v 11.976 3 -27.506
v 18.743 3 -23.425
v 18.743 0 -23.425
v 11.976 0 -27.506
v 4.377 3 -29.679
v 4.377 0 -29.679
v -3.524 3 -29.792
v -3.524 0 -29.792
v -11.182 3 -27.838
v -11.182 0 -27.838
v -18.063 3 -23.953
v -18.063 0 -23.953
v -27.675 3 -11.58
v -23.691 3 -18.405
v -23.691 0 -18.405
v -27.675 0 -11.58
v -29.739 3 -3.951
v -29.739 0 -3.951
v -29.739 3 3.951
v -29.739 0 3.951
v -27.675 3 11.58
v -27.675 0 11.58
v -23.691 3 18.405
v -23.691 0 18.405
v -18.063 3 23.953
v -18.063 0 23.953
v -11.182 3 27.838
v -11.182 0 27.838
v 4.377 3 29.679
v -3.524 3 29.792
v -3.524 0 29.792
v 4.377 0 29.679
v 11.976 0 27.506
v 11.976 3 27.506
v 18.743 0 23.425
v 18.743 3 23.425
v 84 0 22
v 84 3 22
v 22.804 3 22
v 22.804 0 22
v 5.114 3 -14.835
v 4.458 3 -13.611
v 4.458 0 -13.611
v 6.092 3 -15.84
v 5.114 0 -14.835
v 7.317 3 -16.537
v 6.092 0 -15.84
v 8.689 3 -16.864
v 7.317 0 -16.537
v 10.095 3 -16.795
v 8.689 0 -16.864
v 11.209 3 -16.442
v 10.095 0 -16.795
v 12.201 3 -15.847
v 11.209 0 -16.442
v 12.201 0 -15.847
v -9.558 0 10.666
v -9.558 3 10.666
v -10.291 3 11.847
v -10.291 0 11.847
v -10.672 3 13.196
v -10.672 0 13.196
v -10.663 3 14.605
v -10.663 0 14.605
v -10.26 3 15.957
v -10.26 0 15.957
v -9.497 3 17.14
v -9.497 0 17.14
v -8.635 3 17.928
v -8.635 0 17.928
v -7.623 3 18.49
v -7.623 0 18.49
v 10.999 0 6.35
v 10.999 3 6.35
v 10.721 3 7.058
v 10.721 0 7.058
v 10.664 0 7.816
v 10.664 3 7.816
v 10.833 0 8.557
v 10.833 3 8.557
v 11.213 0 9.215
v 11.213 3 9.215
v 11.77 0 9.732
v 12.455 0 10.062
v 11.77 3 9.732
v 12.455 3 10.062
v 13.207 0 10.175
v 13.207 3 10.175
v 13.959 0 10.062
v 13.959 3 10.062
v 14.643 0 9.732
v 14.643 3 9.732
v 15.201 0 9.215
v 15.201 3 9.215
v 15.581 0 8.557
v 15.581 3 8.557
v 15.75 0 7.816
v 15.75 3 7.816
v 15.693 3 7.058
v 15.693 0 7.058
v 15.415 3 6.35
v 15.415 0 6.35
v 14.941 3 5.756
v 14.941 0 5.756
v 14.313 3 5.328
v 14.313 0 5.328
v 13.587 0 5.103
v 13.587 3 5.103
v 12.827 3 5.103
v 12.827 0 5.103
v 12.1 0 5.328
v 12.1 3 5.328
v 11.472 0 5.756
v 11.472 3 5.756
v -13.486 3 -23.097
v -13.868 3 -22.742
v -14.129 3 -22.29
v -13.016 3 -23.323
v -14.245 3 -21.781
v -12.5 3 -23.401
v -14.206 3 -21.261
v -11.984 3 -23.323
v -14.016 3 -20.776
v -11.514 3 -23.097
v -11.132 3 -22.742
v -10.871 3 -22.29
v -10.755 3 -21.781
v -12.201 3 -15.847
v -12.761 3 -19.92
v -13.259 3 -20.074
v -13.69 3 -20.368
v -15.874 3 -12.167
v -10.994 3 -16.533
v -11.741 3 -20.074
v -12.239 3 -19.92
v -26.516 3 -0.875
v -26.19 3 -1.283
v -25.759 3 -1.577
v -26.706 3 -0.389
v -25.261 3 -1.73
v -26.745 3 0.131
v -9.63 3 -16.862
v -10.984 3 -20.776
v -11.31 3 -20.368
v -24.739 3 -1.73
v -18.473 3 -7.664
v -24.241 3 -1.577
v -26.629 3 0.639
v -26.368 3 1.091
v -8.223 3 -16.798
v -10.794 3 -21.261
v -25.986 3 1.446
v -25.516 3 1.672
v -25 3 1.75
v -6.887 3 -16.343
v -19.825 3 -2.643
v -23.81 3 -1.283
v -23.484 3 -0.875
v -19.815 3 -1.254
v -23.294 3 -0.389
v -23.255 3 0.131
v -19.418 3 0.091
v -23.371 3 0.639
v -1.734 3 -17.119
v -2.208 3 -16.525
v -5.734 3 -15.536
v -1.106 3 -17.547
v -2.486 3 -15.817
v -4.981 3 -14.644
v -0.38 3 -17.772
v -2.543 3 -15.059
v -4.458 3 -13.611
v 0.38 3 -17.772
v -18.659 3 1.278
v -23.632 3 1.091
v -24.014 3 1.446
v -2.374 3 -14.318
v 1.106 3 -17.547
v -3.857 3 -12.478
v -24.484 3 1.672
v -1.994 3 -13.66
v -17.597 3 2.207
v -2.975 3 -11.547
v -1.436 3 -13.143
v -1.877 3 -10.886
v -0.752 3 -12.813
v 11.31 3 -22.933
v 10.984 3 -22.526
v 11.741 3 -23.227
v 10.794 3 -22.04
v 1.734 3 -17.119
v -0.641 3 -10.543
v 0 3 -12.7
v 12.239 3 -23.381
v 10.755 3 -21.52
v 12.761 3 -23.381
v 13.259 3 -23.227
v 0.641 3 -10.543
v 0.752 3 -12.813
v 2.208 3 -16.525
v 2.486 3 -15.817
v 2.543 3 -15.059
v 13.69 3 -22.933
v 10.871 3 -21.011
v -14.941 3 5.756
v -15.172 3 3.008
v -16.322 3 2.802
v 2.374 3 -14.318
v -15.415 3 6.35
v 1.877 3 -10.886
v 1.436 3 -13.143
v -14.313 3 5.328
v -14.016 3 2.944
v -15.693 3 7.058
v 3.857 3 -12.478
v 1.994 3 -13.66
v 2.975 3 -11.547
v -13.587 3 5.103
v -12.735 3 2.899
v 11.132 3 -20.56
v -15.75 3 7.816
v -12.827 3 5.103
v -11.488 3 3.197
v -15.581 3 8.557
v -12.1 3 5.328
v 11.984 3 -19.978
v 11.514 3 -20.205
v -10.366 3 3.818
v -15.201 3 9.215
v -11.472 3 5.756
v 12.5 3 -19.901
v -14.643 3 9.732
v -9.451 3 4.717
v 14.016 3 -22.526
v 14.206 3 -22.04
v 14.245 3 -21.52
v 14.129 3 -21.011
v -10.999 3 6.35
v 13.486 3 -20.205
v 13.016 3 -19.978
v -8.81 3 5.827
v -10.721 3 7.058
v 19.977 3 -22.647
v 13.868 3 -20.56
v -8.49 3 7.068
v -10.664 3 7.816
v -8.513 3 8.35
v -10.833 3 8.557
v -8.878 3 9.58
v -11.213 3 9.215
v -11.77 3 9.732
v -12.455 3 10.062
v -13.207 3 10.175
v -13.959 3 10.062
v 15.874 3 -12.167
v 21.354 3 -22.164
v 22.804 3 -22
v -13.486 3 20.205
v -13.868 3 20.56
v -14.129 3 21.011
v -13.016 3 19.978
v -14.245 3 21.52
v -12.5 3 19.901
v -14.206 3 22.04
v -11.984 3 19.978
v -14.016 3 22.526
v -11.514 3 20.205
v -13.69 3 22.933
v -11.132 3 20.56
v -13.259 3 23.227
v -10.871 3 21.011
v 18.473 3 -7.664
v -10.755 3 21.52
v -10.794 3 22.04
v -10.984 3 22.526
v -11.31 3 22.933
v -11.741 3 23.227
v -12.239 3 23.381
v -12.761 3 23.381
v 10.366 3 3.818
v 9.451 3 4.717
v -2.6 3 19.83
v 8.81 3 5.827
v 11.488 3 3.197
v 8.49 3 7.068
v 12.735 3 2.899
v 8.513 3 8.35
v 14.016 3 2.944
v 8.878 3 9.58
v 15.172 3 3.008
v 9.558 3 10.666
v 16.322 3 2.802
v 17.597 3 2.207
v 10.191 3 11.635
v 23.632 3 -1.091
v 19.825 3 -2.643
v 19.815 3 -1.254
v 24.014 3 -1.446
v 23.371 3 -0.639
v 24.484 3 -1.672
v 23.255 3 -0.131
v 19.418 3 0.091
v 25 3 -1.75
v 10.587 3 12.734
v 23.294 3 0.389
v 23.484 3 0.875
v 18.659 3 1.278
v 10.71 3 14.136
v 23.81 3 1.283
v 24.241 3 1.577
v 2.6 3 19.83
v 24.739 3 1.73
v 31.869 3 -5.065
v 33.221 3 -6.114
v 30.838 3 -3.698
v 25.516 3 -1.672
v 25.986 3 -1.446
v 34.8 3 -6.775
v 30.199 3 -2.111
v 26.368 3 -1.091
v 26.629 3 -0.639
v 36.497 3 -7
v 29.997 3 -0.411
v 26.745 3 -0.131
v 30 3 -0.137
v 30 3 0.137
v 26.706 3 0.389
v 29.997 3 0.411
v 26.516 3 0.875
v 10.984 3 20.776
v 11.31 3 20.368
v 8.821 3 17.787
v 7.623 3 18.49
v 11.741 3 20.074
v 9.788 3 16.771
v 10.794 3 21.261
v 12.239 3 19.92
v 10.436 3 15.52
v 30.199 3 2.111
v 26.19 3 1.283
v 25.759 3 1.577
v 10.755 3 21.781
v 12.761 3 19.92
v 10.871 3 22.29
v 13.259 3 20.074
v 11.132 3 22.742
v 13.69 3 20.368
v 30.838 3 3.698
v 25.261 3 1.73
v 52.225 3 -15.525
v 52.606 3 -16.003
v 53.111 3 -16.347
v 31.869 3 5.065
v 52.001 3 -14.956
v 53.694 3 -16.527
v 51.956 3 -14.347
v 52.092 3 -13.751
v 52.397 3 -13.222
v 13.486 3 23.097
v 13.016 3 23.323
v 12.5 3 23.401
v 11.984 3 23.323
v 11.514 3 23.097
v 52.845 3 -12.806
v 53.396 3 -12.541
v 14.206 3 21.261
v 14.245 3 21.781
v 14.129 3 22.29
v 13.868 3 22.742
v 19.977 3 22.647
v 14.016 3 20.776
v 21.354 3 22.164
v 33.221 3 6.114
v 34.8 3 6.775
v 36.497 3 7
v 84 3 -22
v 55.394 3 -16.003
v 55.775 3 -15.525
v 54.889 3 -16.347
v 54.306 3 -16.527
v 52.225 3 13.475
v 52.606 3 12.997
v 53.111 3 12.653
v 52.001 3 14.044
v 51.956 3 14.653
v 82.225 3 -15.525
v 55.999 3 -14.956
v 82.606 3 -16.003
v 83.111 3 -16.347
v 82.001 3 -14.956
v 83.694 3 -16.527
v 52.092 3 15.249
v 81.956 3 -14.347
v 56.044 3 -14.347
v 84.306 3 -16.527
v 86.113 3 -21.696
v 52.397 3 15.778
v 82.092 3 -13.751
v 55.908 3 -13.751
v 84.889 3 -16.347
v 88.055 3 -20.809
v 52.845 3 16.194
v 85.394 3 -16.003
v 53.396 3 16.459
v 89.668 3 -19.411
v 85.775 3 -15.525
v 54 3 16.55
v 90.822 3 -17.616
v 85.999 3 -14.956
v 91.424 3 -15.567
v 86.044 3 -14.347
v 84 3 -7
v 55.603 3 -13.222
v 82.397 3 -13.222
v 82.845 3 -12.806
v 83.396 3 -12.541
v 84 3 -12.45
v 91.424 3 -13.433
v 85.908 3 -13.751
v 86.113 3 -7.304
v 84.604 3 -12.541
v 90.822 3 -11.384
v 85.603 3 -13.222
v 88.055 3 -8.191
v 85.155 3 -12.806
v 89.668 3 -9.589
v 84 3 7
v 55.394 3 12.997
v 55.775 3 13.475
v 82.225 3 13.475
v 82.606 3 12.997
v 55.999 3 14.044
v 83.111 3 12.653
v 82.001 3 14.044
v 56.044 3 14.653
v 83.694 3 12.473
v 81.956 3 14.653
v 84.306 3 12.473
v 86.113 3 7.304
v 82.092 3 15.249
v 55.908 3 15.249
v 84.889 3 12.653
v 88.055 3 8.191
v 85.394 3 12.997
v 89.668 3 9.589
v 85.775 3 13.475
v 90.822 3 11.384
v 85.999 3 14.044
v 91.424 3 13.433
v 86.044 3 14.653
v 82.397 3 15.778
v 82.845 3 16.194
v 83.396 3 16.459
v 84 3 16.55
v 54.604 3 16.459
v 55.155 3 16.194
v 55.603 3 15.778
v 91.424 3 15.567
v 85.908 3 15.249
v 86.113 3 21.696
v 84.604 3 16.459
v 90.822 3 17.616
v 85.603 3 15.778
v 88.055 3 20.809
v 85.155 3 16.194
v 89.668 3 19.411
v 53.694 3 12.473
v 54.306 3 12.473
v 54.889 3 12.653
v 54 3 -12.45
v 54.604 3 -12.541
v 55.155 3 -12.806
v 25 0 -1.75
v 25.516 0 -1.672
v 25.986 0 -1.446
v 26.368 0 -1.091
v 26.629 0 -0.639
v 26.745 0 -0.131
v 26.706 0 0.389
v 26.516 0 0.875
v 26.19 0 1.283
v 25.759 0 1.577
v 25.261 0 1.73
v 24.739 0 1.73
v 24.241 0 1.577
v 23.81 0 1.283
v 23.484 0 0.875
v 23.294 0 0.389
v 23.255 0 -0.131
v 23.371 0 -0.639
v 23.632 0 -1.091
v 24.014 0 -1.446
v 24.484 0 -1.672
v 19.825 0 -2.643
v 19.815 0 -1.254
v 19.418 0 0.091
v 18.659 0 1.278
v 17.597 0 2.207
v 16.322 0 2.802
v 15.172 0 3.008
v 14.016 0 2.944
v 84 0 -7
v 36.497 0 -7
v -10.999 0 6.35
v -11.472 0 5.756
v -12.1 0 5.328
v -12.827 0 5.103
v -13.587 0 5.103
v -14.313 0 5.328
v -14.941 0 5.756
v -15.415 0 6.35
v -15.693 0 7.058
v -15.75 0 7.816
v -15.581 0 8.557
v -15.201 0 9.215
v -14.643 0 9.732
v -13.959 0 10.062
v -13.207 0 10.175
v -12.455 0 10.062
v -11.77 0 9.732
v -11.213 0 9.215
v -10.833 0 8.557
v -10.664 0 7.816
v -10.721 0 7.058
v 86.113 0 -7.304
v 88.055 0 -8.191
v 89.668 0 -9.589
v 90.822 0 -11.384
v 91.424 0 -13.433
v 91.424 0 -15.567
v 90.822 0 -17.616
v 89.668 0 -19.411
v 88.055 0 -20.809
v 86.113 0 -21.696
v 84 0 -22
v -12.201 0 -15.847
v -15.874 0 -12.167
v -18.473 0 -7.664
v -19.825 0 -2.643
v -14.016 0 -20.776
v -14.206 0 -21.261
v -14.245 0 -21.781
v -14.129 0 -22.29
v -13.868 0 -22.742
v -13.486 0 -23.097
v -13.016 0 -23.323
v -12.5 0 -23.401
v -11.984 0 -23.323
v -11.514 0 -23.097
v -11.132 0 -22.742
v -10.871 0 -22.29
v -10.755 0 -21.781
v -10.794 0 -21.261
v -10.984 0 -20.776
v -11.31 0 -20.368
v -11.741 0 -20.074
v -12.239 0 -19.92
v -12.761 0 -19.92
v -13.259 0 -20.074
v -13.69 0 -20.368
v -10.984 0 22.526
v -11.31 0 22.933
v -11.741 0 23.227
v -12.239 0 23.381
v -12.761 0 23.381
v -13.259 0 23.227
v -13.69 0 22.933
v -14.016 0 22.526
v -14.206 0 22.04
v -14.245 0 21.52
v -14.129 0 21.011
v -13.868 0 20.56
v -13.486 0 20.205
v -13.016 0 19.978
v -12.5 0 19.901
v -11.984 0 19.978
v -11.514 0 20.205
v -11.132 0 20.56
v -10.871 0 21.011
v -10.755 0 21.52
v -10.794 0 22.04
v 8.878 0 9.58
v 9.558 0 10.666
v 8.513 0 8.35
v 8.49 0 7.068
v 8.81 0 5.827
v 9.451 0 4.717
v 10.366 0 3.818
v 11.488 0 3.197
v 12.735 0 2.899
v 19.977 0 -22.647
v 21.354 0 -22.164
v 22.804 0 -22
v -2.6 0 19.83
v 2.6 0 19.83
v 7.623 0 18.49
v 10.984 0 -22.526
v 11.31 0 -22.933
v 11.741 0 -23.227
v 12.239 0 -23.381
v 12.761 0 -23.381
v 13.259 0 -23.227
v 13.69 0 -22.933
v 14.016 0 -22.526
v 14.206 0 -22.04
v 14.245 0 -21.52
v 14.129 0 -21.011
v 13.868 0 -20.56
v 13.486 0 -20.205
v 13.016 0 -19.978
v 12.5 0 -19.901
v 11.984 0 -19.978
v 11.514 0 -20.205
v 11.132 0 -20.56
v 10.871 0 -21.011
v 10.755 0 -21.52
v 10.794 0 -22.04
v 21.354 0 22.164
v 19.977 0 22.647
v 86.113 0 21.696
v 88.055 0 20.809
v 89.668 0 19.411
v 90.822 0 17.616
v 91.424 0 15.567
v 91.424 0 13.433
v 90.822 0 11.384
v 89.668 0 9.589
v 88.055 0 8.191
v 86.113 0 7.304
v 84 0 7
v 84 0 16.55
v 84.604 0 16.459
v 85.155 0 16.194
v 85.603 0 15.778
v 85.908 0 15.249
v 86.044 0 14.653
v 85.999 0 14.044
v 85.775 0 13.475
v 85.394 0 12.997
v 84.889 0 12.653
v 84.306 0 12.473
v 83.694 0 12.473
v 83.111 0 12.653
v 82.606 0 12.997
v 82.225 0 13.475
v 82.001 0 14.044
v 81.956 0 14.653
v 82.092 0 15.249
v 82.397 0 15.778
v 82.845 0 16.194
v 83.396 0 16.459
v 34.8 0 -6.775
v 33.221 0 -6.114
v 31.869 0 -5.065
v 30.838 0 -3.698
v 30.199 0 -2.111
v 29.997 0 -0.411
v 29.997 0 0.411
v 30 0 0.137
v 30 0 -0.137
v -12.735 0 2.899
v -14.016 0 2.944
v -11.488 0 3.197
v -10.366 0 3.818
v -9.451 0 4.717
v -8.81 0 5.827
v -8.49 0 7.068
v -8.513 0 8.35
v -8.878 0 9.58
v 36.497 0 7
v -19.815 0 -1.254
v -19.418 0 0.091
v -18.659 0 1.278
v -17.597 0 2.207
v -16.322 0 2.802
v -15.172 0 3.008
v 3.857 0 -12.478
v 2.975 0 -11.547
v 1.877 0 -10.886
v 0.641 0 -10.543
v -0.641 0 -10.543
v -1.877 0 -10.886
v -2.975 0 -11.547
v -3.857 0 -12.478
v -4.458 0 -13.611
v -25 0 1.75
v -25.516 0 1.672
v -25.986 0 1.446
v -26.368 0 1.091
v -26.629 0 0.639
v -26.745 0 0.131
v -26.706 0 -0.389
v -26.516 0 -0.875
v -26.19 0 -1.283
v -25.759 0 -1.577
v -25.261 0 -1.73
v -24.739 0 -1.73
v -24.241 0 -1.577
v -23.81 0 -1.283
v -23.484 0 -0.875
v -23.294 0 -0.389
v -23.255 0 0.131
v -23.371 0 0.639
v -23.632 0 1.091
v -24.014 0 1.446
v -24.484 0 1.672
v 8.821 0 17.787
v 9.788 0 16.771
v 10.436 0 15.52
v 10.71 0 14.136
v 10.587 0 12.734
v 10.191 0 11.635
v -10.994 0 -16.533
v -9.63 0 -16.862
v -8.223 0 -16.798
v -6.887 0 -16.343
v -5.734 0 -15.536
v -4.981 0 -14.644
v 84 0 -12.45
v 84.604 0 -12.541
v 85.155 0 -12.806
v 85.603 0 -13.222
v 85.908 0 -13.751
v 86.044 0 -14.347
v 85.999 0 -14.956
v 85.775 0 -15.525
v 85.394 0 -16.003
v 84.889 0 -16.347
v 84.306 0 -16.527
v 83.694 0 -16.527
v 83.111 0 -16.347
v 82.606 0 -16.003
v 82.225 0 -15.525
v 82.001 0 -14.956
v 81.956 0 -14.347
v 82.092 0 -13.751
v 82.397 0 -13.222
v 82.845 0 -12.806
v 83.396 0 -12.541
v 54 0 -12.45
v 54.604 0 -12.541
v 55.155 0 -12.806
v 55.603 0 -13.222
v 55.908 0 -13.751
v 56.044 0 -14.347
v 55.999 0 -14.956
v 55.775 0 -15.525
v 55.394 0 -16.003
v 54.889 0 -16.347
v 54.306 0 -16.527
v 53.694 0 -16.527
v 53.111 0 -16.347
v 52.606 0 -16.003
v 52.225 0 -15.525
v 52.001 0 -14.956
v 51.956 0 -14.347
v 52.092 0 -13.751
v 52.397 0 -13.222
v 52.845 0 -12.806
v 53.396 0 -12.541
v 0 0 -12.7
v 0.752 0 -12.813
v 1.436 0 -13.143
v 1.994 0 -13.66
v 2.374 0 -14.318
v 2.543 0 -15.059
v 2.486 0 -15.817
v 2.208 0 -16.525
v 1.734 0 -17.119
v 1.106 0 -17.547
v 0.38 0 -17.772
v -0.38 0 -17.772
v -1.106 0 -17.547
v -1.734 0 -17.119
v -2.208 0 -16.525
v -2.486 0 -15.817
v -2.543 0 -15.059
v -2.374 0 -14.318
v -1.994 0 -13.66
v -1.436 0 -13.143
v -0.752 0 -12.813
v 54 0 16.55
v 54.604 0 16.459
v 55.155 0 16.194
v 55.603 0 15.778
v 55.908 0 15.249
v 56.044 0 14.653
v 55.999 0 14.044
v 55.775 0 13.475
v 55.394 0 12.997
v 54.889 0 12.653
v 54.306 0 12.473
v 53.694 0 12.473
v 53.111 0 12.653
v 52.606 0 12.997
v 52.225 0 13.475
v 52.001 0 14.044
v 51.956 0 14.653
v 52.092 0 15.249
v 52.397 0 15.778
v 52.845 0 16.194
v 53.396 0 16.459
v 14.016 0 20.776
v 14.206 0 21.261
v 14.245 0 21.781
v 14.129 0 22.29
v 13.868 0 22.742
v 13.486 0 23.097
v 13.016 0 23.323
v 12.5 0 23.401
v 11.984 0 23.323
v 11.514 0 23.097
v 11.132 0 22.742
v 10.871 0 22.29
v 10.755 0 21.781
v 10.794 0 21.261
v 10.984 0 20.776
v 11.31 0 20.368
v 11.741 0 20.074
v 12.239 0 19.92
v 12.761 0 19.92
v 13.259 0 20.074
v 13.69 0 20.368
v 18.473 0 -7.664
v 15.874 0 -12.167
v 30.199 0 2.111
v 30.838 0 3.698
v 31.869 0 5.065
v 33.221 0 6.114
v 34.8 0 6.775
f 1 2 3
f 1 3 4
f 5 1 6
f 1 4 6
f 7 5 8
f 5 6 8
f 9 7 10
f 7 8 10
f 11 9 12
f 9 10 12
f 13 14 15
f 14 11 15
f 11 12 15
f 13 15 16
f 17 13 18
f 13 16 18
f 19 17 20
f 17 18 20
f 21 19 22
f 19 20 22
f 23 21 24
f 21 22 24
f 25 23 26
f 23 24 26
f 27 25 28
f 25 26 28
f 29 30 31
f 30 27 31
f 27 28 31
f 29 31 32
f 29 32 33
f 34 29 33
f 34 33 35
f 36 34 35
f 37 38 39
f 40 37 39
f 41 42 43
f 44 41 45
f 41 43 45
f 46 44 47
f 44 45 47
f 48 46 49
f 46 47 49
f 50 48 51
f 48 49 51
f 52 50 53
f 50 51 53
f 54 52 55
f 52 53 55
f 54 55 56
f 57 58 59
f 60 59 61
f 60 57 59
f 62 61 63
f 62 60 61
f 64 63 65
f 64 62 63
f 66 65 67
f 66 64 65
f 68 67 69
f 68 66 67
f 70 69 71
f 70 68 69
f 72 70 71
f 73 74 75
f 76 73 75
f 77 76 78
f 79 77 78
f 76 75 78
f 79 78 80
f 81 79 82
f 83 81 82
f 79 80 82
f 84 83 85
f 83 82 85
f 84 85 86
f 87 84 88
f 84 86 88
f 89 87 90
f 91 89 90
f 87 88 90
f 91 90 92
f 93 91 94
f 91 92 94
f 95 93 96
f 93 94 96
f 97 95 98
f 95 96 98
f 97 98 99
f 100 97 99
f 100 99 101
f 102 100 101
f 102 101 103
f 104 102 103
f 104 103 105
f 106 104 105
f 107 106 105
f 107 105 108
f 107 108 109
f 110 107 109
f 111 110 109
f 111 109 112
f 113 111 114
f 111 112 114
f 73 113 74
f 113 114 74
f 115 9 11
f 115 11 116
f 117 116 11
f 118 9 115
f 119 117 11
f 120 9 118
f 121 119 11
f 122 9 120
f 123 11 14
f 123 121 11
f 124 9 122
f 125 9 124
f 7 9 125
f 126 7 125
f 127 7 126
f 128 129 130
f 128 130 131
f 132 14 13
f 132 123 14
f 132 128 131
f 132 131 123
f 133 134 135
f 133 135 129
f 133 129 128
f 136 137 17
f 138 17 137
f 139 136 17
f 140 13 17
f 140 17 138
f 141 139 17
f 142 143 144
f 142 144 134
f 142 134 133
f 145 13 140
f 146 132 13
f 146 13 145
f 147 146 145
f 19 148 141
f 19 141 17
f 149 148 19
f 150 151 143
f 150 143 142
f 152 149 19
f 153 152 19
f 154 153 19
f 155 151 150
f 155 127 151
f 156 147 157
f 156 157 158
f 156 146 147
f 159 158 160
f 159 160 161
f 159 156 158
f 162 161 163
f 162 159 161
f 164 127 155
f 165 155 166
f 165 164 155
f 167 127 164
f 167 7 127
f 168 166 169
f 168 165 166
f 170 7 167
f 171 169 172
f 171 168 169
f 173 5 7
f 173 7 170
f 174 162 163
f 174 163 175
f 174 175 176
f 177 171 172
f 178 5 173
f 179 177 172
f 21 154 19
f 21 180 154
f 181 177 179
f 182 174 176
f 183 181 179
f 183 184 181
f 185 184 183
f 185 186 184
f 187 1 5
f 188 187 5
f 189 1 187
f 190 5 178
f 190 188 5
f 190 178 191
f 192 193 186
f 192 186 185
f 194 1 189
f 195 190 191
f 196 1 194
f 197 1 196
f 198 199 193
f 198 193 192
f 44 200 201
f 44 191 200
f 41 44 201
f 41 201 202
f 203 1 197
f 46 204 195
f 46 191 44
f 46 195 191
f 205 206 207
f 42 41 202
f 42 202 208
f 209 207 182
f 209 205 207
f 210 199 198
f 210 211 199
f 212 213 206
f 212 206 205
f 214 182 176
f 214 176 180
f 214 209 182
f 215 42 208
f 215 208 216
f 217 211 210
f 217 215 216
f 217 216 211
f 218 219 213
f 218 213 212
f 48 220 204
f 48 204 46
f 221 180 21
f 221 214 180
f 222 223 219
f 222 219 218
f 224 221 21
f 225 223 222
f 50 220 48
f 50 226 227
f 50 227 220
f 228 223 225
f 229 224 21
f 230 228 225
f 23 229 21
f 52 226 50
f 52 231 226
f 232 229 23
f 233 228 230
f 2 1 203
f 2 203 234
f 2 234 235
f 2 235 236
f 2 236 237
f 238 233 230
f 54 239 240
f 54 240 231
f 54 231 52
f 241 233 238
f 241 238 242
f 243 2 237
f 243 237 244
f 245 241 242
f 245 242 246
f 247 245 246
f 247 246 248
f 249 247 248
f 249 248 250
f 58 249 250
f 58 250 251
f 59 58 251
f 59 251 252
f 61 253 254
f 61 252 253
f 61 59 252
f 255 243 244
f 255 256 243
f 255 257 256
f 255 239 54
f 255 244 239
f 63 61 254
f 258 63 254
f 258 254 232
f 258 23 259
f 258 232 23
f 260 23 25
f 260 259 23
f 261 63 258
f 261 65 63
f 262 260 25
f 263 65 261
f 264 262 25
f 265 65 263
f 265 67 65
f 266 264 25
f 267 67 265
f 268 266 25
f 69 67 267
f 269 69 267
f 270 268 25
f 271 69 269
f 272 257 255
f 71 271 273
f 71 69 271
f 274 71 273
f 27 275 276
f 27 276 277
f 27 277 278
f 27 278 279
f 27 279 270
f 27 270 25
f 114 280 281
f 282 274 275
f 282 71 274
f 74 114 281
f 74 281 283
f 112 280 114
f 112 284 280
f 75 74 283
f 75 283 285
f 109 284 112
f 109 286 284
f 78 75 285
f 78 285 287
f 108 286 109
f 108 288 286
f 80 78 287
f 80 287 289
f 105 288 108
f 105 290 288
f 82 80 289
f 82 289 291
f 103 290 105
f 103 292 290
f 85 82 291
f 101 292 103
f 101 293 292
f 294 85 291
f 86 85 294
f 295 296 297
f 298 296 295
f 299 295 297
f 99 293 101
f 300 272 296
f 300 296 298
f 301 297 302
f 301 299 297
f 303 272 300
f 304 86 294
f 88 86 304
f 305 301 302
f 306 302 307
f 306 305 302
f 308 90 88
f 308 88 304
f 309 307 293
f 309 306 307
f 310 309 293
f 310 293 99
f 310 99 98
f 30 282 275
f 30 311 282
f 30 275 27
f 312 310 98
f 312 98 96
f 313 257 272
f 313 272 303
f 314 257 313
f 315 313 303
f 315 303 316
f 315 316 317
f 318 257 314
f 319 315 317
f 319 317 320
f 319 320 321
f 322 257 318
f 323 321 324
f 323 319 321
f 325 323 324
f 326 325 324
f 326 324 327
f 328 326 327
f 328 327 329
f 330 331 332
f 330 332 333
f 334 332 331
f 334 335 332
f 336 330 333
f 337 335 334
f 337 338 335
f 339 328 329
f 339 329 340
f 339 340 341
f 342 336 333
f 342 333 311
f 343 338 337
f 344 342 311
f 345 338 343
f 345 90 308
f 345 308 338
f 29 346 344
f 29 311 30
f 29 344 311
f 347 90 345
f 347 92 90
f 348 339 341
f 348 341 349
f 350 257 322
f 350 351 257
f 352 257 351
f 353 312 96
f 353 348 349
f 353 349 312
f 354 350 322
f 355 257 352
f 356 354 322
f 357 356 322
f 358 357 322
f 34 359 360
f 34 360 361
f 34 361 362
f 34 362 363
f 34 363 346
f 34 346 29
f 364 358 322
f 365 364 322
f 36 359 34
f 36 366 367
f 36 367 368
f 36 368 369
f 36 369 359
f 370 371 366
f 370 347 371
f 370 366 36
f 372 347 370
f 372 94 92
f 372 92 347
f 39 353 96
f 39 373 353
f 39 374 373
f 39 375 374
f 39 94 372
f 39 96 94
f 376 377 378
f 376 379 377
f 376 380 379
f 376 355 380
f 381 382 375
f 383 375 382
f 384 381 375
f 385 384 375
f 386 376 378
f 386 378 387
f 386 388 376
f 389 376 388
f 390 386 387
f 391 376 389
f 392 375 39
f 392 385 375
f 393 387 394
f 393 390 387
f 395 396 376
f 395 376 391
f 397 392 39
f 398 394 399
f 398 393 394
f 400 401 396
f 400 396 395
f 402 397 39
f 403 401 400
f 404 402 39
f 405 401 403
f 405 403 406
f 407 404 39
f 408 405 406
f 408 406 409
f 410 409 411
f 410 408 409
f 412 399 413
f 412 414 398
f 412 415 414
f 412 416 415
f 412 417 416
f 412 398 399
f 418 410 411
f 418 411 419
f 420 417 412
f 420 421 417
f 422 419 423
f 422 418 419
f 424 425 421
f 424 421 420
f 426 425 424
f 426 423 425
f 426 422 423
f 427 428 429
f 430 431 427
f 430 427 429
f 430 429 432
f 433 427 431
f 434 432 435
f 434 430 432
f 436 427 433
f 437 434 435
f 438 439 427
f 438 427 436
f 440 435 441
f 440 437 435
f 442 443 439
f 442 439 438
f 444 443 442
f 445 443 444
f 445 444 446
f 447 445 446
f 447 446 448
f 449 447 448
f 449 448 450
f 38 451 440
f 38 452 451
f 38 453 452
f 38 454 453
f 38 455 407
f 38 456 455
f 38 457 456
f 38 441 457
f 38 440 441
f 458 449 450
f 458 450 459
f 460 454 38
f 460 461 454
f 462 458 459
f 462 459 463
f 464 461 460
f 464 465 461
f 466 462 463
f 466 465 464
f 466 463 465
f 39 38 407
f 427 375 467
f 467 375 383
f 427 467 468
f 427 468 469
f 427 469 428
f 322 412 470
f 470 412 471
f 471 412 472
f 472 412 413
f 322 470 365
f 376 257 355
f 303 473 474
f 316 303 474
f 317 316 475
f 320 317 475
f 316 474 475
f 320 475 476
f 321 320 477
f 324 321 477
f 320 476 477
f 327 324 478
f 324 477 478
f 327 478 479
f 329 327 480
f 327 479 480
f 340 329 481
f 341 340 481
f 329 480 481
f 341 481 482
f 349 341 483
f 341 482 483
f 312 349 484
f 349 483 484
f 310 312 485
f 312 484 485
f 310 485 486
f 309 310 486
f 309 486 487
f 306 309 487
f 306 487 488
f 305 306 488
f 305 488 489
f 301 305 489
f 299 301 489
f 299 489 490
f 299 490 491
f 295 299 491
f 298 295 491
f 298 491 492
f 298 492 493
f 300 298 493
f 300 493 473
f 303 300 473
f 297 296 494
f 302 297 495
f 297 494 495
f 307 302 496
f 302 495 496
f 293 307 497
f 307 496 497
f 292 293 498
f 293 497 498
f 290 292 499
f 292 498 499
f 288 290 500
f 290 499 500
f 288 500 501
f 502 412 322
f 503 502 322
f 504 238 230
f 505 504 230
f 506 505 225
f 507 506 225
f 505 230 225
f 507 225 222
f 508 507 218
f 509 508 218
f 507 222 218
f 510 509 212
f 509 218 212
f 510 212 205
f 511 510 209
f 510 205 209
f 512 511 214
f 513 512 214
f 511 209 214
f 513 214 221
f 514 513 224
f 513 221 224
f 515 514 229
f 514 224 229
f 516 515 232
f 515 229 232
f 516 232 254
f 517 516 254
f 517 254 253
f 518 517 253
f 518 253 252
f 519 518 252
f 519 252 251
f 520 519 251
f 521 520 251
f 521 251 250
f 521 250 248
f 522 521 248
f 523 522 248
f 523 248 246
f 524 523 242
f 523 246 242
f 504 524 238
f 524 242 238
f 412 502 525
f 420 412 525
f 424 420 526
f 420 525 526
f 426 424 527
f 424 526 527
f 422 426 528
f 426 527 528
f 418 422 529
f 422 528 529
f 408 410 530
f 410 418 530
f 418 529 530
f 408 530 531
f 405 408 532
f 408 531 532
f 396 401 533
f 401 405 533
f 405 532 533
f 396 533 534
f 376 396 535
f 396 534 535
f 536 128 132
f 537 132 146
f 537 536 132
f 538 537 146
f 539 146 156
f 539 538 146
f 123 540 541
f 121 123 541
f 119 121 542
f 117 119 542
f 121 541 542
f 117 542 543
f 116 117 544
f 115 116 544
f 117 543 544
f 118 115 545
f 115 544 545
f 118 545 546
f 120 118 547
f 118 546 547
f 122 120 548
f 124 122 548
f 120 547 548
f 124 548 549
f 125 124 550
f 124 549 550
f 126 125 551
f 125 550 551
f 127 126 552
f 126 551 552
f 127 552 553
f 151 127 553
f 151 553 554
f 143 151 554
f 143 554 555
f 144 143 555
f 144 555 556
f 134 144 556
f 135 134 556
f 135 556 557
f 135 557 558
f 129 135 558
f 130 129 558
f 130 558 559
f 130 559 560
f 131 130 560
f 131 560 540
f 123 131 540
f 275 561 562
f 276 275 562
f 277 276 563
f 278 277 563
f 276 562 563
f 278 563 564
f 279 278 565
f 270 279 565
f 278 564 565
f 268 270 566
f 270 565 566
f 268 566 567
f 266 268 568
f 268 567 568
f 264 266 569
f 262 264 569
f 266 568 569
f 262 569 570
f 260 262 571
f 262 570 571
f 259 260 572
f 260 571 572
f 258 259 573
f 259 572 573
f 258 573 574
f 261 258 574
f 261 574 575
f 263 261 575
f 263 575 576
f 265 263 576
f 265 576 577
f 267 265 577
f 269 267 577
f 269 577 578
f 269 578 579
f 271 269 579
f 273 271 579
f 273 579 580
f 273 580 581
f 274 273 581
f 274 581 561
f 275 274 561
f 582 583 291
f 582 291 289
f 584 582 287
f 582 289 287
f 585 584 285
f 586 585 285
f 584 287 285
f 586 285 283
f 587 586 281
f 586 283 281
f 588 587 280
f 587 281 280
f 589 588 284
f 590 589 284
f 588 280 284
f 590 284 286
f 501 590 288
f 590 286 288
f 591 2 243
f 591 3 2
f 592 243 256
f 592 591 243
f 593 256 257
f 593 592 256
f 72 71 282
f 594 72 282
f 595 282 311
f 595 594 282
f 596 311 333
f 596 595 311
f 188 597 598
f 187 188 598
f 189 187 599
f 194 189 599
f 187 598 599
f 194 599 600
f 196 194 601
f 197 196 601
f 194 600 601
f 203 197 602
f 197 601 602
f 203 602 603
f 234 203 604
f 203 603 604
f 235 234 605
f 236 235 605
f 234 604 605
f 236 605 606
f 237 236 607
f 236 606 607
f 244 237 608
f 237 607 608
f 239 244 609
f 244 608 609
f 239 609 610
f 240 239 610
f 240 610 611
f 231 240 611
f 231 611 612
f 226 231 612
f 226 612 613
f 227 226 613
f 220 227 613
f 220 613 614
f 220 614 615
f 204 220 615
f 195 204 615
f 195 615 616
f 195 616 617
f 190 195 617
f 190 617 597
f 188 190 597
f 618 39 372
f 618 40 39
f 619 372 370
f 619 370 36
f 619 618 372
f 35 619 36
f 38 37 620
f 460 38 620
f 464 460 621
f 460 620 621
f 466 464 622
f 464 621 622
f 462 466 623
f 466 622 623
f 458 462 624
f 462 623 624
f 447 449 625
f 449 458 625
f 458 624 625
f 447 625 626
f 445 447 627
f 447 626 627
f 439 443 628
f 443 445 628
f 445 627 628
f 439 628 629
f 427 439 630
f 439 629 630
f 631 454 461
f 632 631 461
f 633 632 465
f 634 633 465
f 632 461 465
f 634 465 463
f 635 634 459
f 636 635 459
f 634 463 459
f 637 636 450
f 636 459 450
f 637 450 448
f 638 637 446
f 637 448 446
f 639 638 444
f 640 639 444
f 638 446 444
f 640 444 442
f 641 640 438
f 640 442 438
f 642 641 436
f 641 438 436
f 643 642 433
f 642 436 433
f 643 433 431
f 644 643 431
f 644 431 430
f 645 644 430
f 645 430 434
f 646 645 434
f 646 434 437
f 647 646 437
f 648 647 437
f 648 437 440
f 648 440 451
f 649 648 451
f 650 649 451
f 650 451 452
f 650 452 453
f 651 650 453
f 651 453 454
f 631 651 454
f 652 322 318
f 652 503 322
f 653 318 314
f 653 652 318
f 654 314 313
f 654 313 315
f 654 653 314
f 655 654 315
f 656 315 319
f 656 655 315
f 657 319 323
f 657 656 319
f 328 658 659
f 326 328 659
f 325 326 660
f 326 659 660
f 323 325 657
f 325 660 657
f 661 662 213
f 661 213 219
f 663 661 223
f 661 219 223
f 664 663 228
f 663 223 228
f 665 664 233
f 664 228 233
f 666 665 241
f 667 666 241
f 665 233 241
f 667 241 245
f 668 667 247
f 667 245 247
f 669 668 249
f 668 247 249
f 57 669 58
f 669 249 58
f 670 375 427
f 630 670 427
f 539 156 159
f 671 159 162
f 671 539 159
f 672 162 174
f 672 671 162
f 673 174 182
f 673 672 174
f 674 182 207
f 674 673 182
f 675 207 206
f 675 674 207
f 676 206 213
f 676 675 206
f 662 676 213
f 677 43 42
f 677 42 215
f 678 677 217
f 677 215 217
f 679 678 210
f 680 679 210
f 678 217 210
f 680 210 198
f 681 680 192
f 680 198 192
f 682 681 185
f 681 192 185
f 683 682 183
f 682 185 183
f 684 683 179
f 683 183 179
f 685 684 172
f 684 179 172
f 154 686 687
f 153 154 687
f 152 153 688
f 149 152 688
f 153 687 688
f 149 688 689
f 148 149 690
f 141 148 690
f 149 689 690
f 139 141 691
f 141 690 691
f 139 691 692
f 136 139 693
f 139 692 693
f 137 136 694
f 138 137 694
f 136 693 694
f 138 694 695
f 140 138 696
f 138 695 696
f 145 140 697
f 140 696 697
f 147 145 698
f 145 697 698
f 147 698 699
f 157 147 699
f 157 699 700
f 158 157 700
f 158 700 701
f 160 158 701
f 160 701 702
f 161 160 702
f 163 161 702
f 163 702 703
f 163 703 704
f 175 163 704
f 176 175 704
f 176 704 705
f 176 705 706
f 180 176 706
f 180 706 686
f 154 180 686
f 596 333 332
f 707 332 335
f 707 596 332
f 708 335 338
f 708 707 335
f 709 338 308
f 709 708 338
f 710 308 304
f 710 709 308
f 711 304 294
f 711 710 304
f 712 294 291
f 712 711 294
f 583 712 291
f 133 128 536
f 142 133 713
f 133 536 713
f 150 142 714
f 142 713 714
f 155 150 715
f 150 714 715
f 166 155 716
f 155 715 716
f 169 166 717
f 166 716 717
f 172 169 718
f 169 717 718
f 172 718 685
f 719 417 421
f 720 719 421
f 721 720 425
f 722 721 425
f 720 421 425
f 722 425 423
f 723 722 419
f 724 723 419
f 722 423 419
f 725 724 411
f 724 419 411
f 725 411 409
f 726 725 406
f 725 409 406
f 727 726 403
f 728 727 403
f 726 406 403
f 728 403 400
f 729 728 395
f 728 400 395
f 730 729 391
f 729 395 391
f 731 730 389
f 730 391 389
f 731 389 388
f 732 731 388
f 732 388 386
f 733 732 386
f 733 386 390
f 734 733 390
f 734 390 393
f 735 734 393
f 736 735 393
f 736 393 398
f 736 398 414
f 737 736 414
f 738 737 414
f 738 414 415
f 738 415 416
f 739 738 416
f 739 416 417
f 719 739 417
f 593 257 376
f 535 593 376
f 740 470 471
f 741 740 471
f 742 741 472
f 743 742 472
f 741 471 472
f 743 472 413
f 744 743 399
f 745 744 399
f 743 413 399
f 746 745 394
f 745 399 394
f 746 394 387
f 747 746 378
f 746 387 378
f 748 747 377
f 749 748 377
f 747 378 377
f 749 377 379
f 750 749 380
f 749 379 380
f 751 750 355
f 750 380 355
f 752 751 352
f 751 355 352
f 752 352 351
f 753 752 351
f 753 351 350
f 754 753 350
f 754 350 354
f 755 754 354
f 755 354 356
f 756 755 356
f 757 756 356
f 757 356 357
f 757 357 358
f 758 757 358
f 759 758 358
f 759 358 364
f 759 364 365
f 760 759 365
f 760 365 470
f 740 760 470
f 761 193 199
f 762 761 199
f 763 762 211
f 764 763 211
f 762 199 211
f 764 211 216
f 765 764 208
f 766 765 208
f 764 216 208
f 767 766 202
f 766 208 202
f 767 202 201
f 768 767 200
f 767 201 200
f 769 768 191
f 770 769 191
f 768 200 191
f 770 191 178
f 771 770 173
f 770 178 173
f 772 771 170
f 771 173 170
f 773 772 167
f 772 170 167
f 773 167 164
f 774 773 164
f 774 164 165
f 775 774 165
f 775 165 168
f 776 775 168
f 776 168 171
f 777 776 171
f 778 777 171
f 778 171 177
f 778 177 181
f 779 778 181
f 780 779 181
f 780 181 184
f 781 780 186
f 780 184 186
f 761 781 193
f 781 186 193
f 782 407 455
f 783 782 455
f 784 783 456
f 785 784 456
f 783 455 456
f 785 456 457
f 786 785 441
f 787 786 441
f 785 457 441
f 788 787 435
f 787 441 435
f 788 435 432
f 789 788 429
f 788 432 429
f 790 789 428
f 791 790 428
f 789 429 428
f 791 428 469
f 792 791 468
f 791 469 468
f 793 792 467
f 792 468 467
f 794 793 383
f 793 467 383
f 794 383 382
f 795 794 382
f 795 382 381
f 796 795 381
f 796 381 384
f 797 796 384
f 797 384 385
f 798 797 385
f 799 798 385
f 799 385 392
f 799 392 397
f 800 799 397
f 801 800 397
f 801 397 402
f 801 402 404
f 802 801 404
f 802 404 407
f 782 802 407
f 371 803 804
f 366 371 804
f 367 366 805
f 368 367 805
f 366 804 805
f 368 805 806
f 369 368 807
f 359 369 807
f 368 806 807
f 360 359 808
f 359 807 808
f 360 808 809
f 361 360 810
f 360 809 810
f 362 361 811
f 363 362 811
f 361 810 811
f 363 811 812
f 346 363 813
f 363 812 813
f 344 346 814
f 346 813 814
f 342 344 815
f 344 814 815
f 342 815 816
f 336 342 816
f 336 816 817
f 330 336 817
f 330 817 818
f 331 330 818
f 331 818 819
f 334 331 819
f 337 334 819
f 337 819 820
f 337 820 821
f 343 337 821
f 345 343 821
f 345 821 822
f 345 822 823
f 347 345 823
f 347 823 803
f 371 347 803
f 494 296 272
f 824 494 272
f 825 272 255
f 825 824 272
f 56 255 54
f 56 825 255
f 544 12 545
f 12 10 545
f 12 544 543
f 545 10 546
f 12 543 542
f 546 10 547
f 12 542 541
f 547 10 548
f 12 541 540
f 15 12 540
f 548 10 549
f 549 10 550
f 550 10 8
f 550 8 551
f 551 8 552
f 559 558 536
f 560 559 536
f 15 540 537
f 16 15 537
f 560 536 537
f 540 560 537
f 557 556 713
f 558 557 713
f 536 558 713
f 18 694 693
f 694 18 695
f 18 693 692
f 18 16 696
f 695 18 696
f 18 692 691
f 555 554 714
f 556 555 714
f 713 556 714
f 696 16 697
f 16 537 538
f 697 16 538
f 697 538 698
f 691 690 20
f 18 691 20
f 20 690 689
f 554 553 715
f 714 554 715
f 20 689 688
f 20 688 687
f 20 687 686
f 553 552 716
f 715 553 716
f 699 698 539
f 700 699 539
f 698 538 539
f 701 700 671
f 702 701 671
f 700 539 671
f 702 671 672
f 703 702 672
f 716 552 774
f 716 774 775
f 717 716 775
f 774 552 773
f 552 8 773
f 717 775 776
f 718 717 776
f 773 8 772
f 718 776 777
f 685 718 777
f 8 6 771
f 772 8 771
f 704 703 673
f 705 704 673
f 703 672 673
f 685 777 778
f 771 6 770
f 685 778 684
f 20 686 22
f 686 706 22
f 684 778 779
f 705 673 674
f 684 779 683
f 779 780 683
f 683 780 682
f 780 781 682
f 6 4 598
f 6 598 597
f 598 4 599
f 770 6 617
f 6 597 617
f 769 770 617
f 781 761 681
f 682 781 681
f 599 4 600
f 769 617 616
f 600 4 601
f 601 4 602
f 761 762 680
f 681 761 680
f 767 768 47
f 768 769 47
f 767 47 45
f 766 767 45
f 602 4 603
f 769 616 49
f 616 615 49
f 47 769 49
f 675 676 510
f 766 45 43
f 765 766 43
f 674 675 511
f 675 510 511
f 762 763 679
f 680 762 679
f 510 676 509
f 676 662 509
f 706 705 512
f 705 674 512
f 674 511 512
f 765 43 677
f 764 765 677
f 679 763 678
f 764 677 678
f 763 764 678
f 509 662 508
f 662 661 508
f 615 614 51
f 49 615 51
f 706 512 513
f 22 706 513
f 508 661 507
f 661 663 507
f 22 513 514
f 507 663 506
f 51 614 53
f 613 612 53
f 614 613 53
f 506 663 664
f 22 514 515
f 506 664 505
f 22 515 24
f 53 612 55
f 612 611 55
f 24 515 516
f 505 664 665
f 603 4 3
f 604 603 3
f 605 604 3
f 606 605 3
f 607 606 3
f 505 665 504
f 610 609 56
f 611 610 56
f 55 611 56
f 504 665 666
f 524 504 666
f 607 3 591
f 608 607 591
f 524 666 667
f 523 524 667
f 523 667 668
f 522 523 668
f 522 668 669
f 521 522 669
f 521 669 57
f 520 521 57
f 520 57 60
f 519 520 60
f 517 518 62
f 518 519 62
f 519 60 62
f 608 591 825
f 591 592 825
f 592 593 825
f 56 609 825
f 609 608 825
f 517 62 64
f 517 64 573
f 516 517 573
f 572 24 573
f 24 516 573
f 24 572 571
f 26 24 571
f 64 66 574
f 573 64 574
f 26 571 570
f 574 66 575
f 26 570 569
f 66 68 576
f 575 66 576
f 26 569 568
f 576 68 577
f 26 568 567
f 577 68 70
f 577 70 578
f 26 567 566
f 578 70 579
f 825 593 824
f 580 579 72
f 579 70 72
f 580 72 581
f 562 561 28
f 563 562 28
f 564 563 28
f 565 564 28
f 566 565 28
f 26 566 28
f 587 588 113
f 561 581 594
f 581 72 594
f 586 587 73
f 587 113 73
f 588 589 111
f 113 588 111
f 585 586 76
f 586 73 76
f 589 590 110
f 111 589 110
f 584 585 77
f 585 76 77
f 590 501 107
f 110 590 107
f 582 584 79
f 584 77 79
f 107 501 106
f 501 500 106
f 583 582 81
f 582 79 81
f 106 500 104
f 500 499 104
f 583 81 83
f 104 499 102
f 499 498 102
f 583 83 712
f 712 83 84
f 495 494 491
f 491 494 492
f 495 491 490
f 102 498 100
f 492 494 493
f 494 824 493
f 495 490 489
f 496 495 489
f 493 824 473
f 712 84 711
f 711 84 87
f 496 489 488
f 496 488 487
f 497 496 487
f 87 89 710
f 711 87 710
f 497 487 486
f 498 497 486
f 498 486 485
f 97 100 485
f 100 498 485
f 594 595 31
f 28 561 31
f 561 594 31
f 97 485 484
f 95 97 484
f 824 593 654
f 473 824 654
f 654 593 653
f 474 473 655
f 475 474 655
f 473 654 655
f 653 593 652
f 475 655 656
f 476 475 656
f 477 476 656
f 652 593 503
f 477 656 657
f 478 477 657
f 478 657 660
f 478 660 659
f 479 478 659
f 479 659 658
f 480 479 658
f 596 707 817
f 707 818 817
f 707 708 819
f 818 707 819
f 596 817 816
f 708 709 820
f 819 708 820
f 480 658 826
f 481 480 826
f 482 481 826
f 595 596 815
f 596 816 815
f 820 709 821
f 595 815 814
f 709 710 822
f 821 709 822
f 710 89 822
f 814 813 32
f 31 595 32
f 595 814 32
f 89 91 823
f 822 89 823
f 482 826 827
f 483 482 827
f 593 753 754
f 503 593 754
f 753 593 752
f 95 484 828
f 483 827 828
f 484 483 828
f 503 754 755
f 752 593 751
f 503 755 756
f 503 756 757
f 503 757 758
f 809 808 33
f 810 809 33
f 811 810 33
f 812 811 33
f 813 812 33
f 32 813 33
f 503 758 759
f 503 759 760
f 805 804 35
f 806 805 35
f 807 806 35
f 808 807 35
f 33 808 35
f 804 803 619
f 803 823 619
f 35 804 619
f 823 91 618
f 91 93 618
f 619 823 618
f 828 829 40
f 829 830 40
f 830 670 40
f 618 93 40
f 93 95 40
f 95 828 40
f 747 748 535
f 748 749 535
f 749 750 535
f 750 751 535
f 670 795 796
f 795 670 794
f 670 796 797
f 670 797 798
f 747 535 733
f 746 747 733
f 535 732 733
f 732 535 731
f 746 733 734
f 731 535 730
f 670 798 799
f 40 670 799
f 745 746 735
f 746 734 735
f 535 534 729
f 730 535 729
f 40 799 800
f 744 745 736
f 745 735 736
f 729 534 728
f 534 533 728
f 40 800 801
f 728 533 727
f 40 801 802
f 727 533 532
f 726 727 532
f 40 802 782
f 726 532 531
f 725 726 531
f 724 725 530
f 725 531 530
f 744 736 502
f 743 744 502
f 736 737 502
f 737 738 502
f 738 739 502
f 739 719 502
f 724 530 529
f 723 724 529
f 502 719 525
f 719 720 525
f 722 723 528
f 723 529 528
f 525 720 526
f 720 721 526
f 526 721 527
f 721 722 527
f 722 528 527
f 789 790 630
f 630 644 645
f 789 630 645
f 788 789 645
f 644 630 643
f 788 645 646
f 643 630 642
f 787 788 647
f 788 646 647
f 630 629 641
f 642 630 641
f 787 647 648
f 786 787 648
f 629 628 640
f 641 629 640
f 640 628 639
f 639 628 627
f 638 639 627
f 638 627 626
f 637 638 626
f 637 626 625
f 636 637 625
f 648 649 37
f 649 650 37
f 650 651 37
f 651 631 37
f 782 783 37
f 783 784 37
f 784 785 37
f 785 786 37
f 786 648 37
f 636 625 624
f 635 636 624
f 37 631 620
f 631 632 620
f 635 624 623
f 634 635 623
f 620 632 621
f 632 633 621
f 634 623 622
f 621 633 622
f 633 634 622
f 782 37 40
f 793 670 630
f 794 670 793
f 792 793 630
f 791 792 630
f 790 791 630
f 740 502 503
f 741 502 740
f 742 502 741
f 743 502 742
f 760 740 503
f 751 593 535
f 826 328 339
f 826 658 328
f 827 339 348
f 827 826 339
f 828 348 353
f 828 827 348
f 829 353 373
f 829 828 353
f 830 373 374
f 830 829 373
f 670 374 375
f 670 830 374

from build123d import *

# Parameters (mm, degrees)
SKETCH1_R           = 30
SKETCH1_R_2         = 20
BOSS_EXTRUDE1_DEPTH = 3
SKETCH2_R           = 2.55
BOSS_EXTRUDE2_DEPTH = 3
CIRPATTERN1_COUNT   = 3
BOSS_EXTRUDE3_DEPTH = 3
SKETCH4_R           = 2.05
CUT_EXTRUDE1_DEPTH  = 104.489129864
SKETCH6_R           = 1.75
CUT_EXTRUDE2_DEPTH  = 104.489129864
CIRPATTERN2_COUNT   = 6
CUT_EXTRUDE3_DEPTH  = 104.489129864
FILLET1_R           = 5
FILLET2_R           = 6.5


with BuildPart() as part:
    # Sketch1 → Boss-Extrude1 (new body)
    with BuildSketch(Plane(origin=(0, 0, 0), x_dir=(1, 0, 0), z_dir=(0, 1, 0))):
        with Locations(Location((0, 0, 0), (0, 0, 270))):
            Circle(SKETCH1_R)
        with Locations(Location((0, 0, 0), (0, 0, 270))):
            Circle(SKETCH1_R_2, mode=Mode.SUBTRACT)
    extrude(amount=BOSS_EXTRUDE1_DEPTH)

    # Sketch2 → Boss-Extrude2 (add)
    with BuildSketch(Plane(origin=(0, 3, 0), x_dir=(1, 0, 0), z_dir=(0, 1, 0))):
        with BuildLine():
            Line((-4.75, 15.25), (-4.75, 19.42775077))
            ThreePointArc((-4.75, 19.42775077), (0, 20), (4.75, 19.42775077))
            Line((4.75, 19.42775077), (4.75, 15.25))
            ThreePointArc((4.75, 15.25), (0, 10.5), (-4.75, 15.25))
        make_face()
        with Locations(Location((0, 15.25, 0), (0, 0, 270))):
            Circle(SKETCH2_R, mode=Mode.SUBTRACT)
    boss_extrude2 = extrude(amount=-BOSS_EXTRUDE2_DEPTH)

    # CirPattern1: Boss-Extrude2 ×3 about axis
    cirpattern1_axis = Axis((0, 0, 0), (0, 1, 0))
    for i in range(1, CIRPATTERN1_COUNT):
        add(boss_extrude2.rotate(cirpattern1_axis, i * 360 / CIRPATTERN1_COUNT))

    # Sketch3 → Boss-Extrude3 (add)
    with BuildSketch(Plane(origin=(0, 3, 0), x_dir=(1, 0, 0), z_dir=(0, 1, 0))):
        with BuildLine():
            Line((20.396078054, 22), (99, 22))
            Line((99, 22), (99, 7))
            Line((99, 7), (29.171904292, 7))
            ThreePointArc((29.171904292, 7), (25.893941733, 15.149382216), (20.396078054, 22))
        make_face()
        with BuildLine():
            Line((29.171904292, -7), (99, -7))
            Line((99, -7), (99, -22))
            Line((99, -22), (20.396078054, -22))
            ThreePointArc((20.396078054, -22), (25.893941733, -15.149382216), (29.171904292, -7))
        make_face()
    extrude(amount=-BOSS_EXTRUDE3_DEPTH)

    # Sketch4 → Cut-Extrude1 (cut, through all)
    with BuildSketch(Plane(origin=(0, 3, 0), x_dir=(1, 0, 0), z_dir=(0, 1, 0))):
        with Locations(Location((54, 14.5, 0), (0, 0, 270))):
            Circle(SKETCH4_R)
        with Locations(Location((84, 14.5, 0), (0, 0, 270))):
            Circle(SKETCH4_R)
        with Locations(Location((54, -14.5, 0), (0, 0, 270))):
            Circle(SKETCH4_R)
        with Locations(Location((84, -14.5, 0), (0, 0, 270))):
            Circle(SKETCH4_R)
    extrude(amount=-CUT_EXTRUDE1_DEPTH, mode=Mode.SUBTRACT)

    # Sketch6 → Cut-Extrude2 (cut, through all)
    with BuildSketch(Plane.XZ):
        with Locations(Location((25, 0, 0), (0, 0, 270))):
            Circle(SKETCH6_R)
    cut_extrude2 = extrude(amount=-CUT_EXTRUDE2_DEPTH, mode=Mode.SUBTRACT)

    # CirPattern2: Cut-Extrude2 ×6 about axis
    cirpattern2_axis = Axis((0, 0, 0), (0, 1, 0))
    for i in range(1, CIRPATTERN2_COUNT):
        add(cut_extrude2.rotate(cirpattern2_axis, i * 360 / CIRPATTERN2_COUNT), mode=Mode.SUBTRACT)

    # Sketch7 → Cut-Extrude3 (cut, through all)
    with BuildSketch(Plane.XZ):
        with BuildLine():
            Line((99, 22), (84, 22))
            ThreePointArc((84, 22), (91.5, 14.5), (84, 7))
            Line((84, 7), (99, 7))
            Line((99, 7), (99, 22))
        make_face()
        with BuildLine():
            Line((99, -7), (84, -7))
            ThreePointArc((84, -7), (91.5, -14.5), (84, -22))
            Line((84, -22), (99, -22))
            Line((99, -22), (99, -7))
        make_face()
    extrude(amount=-CUT_EXTRUDE3_DEPTH, mode=Mode.SUBTRACT)

    # Fillet1
    fillet1_edges = [part.edges().sort_by_distance(p)[0] for p in [
        (19.199925706, 1.5, 5.600254717),
        (14.449925706, 1.5, 13.827496053),
        (-19.199925706, 1.5, 5.600254717),
        (-14.449925706, 1.5, 13.827496053),
        (4.75, 1.5, -19.42775077),
        (-4.75, 1.5, -19.42775077),
    ]]
    fillet(fillet1_edges, radius=FILLET1_R)

    # Fillet2
    fillet2_edges = [part.edges().sort_by_distance(p)[0] for p in [
        (29.171904292, 1.5, -7),
        (20.396078054, 1.5, -22),
        (20.396078054, 1.5, 22),
        (29.171904292, 1.5, 7),
    ]]
    fillet(fillet2_edges, radius=FILLET2_R)


solid = part.part
